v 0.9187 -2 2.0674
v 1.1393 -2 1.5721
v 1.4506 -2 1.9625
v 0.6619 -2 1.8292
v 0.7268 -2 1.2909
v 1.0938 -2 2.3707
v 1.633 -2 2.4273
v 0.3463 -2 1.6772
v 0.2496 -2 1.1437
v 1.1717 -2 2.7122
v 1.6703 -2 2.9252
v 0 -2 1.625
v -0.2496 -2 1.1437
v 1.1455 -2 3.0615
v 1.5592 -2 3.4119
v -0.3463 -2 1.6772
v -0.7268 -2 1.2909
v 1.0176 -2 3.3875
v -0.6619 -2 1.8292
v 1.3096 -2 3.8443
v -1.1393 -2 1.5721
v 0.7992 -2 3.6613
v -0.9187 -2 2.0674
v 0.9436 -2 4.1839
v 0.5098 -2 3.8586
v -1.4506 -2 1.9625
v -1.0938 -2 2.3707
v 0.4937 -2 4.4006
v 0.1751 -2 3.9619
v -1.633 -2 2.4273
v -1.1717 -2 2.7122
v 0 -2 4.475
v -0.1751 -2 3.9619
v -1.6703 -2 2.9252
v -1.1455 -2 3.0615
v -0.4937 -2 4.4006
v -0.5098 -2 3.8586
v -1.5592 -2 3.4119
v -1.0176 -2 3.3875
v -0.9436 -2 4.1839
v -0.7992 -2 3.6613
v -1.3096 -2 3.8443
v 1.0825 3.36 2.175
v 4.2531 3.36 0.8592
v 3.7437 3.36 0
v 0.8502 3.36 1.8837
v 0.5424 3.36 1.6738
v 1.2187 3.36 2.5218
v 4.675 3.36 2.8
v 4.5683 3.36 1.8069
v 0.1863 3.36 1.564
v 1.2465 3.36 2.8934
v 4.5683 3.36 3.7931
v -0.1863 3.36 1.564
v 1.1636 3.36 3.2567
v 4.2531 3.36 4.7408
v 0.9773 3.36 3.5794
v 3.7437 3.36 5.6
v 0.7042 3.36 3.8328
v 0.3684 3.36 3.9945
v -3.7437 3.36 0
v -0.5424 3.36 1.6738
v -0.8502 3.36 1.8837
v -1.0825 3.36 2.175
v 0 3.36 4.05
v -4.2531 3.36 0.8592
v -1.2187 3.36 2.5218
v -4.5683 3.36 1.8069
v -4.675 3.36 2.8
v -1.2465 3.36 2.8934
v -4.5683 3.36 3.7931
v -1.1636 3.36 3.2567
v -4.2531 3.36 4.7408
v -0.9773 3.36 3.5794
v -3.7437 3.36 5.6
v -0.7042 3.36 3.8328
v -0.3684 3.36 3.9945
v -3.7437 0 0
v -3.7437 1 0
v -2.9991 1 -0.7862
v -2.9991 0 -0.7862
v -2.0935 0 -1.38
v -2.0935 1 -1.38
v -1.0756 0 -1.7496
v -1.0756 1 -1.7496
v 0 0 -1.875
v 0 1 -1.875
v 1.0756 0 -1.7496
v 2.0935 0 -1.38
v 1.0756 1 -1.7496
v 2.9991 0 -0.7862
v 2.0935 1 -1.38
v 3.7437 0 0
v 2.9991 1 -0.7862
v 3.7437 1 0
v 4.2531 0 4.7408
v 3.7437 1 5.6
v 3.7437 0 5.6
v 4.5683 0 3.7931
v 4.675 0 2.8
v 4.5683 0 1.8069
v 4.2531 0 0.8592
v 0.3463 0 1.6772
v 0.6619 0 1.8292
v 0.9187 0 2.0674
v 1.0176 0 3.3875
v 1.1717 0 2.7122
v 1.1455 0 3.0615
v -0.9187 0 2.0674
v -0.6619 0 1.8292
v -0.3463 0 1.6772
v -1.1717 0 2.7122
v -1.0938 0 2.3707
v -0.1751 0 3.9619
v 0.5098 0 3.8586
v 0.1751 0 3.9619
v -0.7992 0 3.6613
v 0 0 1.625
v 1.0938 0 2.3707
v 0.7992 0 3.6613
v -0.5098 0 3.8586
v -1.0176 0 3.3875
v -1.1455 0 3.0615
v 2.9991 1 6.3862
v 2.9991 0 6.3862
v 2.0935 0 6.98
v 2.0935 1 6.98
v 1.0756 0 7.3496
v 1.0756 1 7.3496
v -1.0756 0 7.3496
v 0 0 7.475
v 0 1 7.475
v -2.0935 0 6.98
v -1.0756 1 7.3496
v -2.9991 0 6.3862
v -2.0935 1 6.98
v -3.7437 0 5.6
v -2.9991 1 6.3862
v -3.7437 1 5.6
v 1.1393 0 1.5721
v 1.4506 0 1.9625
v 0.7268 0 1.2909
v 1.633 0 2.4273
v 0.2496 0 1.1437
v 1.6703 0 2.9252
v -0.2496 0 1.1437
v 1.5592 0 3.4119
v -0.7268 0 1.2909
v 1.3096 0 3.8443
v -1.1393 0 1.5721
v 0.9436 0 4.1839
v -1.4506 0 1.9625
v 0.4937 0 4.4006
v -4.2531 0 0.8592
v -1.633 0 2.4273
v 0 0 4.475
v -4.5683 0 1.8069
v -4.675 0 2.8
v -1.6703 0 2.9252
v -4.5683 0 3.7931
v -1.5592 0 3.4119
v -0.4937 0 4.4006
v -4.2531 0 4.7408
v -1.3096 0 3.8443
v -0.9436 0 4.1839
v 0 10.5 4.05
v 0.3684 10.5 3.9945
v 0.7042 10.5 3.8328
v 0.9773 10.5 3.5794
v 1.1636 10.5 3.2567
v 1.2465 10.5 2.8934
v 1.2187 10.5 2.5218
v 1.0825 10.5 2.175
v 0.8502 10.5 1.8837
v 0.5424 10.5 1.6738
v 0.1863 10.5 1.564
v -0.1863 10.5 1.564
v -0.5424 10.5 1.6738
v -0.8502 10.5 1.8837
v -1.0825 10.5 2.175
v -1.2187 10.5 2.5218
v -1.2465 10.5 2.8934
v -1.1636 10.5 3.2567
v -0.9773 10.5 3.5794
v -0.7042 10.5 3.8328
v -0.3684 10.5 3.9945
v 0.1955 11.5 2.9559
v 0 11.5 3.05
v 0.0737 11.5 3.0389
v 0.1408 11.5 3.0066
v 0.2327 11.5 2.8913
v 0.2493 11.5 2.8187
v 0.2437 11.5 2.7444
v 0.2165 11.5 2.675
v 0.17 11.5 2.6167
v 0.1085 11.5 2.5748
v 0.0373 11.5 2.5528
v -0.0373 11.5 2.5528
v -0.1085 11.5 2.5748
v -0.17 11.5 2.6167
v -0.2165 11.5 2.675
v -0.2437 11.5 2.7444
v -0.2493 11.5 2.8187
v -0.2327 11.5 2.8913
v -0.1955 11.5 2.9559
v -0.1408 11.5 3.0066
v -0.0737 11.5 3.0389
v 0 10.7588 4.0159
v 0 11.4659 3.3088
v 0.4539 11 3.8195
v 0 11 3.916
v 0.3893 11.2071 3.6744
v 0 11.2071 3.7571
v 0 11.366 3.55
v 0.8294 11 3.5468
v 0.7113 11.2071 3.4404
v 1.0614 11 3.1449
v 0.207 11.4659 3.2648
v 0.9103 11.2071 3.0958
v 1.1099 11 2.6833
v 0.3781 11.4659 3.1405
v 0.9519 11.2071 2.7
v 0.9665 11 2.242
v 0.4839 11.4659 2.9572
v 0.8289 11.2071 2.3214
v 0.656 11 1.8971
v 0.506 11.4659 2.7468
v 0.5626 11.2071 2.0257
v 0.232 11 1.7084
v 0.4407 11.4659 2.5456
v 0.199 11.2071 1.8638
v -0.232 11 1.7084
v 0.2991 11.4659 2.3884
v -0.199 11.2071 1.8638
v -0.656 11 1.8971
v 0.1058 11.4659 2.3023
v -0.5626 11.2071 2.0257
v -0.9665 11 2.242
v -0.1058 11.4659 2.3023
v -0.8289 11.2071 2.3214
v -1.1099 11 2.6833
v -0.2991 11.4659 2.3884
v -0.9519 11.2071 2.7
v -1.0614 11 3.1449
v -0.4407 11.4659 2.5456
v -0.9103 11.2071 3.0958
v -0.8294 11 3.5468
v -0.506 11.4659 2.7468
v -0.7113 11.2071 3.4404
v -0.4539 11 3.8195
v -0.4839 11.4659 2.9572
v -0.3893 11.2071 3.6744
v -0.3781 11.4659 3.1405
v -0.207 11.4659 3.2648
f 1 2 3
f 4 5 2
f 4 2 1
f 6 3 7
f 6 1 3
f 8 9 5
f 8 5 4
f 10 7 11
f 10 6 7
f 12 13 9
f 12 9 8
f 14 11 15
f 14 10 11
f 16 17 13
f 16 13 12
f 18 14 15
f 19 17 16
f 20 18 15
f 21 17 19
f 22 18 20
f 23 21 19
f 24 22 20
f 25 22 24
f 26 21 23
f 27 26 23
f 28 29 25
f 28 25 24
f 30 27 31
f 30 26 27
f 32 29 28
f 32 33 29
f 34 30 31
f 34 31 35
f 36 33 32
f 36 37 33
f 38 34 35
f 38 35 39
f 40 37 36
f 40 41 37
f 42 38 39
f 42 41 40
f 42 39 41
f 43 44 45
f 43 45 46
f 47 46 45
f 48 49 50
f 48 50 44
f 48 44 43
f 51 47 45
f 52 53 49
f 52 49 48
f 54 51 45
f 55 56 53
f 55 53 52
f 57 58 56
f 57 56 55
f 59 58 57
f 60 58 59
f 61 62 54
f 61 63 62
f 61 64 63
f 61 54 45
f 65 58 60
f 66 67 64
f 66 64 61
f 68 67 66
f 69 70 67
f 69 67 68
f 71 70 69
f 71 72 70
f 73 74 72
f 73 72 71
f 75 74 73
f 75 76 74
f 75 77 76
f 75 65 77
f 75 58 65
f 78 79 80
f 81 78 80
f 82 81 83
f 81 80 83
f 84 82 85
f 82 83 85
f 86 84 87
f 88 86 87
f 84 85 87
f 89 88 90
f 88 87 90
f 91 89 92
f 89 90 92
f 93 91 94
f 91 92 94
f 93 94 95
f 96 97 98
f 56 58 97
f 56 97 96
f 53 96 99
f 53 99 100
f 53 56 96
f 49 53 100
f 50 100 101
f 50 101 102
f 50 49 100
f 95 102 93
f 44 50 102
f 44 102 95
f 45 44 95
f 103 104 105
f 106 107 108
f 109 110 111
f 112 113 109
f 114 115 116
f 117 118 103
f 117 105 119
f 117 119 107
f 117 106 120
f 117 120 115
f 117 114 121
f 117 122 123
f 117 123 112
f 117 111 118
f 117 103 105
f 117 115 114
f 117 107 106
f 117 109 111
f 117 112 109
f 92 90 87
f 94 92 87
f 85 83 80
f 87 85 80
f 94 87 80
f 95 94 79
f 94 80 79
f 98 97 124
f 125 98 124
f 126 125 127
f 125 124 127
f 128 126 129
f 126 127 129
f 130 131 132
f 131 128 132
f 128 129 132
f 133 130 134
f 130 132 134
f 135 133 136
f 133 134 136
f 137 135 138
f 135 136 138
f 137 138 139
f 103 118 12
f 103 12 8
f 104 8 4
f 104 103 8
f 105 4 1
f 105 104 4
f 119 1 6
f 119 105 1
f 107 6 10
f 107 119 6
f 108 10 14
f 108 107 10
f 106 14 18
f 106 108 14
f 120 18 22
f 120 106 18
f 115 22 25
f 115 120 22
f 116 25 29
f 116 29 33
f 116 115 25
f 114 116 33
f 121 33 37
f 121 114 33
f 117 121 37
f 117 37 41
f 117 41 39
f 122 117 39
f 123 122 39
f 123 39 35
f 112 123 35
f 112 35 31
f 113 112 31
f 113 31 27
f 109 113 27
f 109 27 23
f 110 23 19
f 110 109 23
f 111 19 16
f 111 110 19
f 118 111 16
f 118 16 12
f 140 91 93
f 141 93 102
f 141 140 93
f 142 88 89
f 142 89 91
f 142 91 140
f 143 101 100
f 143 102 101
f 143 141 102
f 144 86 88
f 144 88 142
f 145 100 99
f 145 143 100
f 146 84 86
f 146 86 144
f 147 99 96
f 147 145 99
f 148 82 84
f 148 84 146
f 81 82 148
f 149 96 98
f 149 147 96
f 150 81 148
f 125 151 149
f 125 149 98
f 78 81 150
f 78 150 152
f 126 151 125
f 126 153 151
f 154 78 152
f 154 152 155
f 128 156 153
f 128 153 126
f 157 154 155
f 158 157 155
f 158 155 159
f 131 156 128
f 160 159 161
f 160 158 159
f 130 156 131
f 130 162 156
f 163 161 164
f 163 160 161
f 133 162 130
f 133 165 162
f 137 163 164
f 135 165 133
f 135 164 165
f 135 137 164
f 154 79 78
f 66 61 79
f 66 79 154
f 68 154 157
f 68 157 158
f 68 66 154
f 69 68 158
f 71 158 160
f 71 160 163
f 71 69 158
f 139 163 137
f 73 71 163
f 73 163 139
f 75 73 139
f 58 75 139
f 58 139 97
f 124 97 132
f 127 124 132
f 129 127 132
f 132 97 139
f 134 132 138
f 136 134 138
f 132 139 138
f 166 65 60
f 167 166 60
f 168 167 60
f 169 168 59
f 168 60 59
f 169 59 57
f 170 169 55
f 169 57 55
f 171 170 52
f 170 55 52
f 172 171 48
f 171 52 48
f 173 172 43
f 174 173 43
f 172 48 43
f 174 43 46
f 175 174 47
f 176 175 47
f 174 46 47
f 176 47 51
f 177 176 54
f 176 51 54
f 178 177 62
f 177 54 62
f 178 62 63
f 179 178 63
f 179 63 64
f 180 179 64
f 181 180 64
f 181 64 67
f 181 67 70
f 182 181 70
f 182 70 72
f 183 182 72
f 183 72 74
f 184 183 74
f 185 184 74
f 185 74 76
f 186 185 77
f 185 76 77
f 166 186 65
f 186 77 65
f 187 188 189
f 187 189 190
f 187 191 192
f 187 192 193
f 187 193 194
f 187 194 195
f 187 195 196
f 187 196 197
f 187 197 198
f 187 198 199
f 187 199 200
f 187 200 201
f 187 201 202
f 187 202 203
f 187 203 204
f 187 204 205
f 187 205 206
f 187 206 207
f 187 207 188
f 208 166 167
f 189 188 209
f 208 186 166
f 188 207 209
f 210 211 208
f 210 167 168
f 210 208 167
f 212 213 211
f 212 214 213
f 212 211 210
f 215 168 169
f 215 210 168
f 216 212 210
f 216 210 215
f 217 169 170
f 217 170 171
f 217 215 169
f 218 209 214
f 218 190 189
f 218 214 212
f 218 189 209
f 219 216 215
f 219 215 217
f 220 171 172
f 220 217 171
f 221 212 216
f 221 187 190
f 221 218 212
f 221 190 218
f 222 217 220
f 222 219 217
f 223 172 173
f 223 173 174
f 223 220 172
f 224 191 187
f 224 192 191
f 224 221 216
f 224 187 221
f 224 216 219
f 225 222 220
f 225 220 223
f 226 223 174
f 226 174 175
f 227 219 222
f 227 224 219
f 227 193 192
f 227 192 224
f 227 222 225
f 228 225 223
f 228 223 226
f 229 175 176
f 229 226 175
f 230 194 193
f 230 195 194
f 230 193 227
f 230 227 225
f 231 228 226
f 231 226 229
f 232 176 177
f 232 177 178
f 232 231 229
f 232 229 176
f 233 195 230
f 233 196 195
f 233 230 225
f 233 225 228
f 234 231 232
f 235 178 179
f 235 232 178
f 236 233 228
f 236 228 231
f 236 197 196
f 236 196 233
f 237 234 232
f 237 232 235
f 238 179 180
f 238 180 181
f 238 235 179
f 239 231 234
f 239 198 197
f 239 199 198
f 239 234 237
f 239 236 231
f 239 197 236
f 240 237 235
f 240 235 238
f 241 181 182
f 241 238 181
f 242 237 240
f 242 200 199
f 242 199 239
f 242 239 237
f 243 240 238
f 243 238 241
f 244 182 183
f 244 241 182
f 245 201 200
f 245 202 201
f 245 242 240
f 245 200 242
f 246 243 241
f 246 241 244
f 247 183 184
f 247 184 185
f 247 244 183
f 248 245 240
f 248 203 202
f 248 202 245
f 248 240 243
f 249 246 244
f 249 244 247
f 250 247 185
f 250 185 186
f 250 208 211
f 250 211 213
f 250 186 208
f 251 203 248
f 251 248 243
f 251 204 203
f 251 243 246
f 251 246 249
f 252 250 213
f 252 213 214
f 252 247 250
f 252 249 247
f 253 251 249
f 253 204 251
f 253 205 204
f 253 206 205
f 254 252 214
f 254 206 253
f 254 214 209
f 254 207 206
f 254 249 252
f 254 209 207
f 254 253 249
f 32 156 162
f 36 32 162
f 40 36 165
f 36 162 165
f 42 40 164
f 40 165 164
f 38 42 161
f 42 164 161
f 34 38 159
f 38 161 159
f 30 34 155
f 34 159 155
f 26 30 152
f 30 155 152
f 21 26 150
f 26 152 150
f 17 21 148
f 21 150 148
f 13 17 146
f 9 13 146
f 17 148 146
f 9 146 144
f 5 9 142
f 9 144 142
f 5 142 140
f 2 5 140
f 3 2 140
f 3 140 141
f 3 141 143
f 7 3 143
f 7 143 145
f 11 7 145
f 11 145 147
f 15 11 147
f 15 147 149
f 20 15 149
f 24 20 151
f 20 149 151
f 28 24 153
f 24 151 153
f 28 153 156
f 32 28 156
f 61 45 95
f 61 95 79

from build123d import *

# Parameters (mm, degrees)
BASE_EXTRUDE_DEPTH  = 3.36
SKETCH3_R           = 1.25
BOSS_EXTRUDE1_DEPTH = 8.14
FILLET1_R           = 1
BOSS_EXTRUDE2_START = -1
SKETCH4_R           = 4.675
BOSS_EXTRUDE2_DEPTH = 1
SKETCH5_R           = 1.675
SKETCH5_R_2         = 1.175
BOSS_EXTRUDE3_DEPTH = 2


with BuildPart() as part:
    # Sketch2 → Base-Extrude (new body)
    with BuildSketch(Plane(origin=(0, 3.36, 0), x_dir=(-1, 0, 0), z_dir=(0, 1, 0))):
        with BuildLine():
            Line((-3.743744783, 0), (3.743744783, 0))
            ThreePointArc((3.743744783, 0), (4.675, 2.8), (3.743744783, 5.6))
            Line((3.743744783, 5.6), (-3.743744783, 5.6))
            ThreePointArc((-3.743744783, 5.6), (-4.675, 2.8), (-3.743744783, 0))
        make_face()
    extrude(amount=-BASE_EXTRUDE_DEPTH)

    # Sketch3 → Boss-Extrude1 (add)
    with BuildSketch(Plane(origin=(0, 3.36, 0), x_dir=(-1, 0, 0), z_dir=(0, 1, 0))):
        with Locations(Location((0, 2.8, 0), (0, 0, 90))):
            Circle(SKETCH3_R)
    extrude(amount=BOSS_EXTRUDE1_DEPTH)

    # Fillet1
    fillet1_edges = [part.edges().sort_by_distance(p)[0] for p in [
        (0, 11.5, 1.55),
    ]]
    fillet(fillet1_edges, radius=FILLET1_R)

    # Sketch4 → Boss-Extrude2 (add)
    with BuildSketch(Plane.XZ.offset(BOSS_EXTRUDE2_START)):
        with Locations(Location((0, 2.8, 0), (0, 0, 90))):
            Circle(SKETCH4_R)
    extrude(amount=BOSS_EXTRUDE2_DEPTH)

    # Sketch5 → Boss-Extrude3 (add)
    with BuildSketch(Plane.XZ):
        with Locations(Location((0, 2.8, 0), (0, 0, 90))):
            Circle(SKETCH5_R)
        with Locations(Location((0, 2.8, 0), (0, 0, 270))):
            Circle(SKETCH5_R_2, mode=Mode.SUBTRACT)
    extrude(amount=BOSS_EXTRUDE3_DEPTH)


solid = part.part
